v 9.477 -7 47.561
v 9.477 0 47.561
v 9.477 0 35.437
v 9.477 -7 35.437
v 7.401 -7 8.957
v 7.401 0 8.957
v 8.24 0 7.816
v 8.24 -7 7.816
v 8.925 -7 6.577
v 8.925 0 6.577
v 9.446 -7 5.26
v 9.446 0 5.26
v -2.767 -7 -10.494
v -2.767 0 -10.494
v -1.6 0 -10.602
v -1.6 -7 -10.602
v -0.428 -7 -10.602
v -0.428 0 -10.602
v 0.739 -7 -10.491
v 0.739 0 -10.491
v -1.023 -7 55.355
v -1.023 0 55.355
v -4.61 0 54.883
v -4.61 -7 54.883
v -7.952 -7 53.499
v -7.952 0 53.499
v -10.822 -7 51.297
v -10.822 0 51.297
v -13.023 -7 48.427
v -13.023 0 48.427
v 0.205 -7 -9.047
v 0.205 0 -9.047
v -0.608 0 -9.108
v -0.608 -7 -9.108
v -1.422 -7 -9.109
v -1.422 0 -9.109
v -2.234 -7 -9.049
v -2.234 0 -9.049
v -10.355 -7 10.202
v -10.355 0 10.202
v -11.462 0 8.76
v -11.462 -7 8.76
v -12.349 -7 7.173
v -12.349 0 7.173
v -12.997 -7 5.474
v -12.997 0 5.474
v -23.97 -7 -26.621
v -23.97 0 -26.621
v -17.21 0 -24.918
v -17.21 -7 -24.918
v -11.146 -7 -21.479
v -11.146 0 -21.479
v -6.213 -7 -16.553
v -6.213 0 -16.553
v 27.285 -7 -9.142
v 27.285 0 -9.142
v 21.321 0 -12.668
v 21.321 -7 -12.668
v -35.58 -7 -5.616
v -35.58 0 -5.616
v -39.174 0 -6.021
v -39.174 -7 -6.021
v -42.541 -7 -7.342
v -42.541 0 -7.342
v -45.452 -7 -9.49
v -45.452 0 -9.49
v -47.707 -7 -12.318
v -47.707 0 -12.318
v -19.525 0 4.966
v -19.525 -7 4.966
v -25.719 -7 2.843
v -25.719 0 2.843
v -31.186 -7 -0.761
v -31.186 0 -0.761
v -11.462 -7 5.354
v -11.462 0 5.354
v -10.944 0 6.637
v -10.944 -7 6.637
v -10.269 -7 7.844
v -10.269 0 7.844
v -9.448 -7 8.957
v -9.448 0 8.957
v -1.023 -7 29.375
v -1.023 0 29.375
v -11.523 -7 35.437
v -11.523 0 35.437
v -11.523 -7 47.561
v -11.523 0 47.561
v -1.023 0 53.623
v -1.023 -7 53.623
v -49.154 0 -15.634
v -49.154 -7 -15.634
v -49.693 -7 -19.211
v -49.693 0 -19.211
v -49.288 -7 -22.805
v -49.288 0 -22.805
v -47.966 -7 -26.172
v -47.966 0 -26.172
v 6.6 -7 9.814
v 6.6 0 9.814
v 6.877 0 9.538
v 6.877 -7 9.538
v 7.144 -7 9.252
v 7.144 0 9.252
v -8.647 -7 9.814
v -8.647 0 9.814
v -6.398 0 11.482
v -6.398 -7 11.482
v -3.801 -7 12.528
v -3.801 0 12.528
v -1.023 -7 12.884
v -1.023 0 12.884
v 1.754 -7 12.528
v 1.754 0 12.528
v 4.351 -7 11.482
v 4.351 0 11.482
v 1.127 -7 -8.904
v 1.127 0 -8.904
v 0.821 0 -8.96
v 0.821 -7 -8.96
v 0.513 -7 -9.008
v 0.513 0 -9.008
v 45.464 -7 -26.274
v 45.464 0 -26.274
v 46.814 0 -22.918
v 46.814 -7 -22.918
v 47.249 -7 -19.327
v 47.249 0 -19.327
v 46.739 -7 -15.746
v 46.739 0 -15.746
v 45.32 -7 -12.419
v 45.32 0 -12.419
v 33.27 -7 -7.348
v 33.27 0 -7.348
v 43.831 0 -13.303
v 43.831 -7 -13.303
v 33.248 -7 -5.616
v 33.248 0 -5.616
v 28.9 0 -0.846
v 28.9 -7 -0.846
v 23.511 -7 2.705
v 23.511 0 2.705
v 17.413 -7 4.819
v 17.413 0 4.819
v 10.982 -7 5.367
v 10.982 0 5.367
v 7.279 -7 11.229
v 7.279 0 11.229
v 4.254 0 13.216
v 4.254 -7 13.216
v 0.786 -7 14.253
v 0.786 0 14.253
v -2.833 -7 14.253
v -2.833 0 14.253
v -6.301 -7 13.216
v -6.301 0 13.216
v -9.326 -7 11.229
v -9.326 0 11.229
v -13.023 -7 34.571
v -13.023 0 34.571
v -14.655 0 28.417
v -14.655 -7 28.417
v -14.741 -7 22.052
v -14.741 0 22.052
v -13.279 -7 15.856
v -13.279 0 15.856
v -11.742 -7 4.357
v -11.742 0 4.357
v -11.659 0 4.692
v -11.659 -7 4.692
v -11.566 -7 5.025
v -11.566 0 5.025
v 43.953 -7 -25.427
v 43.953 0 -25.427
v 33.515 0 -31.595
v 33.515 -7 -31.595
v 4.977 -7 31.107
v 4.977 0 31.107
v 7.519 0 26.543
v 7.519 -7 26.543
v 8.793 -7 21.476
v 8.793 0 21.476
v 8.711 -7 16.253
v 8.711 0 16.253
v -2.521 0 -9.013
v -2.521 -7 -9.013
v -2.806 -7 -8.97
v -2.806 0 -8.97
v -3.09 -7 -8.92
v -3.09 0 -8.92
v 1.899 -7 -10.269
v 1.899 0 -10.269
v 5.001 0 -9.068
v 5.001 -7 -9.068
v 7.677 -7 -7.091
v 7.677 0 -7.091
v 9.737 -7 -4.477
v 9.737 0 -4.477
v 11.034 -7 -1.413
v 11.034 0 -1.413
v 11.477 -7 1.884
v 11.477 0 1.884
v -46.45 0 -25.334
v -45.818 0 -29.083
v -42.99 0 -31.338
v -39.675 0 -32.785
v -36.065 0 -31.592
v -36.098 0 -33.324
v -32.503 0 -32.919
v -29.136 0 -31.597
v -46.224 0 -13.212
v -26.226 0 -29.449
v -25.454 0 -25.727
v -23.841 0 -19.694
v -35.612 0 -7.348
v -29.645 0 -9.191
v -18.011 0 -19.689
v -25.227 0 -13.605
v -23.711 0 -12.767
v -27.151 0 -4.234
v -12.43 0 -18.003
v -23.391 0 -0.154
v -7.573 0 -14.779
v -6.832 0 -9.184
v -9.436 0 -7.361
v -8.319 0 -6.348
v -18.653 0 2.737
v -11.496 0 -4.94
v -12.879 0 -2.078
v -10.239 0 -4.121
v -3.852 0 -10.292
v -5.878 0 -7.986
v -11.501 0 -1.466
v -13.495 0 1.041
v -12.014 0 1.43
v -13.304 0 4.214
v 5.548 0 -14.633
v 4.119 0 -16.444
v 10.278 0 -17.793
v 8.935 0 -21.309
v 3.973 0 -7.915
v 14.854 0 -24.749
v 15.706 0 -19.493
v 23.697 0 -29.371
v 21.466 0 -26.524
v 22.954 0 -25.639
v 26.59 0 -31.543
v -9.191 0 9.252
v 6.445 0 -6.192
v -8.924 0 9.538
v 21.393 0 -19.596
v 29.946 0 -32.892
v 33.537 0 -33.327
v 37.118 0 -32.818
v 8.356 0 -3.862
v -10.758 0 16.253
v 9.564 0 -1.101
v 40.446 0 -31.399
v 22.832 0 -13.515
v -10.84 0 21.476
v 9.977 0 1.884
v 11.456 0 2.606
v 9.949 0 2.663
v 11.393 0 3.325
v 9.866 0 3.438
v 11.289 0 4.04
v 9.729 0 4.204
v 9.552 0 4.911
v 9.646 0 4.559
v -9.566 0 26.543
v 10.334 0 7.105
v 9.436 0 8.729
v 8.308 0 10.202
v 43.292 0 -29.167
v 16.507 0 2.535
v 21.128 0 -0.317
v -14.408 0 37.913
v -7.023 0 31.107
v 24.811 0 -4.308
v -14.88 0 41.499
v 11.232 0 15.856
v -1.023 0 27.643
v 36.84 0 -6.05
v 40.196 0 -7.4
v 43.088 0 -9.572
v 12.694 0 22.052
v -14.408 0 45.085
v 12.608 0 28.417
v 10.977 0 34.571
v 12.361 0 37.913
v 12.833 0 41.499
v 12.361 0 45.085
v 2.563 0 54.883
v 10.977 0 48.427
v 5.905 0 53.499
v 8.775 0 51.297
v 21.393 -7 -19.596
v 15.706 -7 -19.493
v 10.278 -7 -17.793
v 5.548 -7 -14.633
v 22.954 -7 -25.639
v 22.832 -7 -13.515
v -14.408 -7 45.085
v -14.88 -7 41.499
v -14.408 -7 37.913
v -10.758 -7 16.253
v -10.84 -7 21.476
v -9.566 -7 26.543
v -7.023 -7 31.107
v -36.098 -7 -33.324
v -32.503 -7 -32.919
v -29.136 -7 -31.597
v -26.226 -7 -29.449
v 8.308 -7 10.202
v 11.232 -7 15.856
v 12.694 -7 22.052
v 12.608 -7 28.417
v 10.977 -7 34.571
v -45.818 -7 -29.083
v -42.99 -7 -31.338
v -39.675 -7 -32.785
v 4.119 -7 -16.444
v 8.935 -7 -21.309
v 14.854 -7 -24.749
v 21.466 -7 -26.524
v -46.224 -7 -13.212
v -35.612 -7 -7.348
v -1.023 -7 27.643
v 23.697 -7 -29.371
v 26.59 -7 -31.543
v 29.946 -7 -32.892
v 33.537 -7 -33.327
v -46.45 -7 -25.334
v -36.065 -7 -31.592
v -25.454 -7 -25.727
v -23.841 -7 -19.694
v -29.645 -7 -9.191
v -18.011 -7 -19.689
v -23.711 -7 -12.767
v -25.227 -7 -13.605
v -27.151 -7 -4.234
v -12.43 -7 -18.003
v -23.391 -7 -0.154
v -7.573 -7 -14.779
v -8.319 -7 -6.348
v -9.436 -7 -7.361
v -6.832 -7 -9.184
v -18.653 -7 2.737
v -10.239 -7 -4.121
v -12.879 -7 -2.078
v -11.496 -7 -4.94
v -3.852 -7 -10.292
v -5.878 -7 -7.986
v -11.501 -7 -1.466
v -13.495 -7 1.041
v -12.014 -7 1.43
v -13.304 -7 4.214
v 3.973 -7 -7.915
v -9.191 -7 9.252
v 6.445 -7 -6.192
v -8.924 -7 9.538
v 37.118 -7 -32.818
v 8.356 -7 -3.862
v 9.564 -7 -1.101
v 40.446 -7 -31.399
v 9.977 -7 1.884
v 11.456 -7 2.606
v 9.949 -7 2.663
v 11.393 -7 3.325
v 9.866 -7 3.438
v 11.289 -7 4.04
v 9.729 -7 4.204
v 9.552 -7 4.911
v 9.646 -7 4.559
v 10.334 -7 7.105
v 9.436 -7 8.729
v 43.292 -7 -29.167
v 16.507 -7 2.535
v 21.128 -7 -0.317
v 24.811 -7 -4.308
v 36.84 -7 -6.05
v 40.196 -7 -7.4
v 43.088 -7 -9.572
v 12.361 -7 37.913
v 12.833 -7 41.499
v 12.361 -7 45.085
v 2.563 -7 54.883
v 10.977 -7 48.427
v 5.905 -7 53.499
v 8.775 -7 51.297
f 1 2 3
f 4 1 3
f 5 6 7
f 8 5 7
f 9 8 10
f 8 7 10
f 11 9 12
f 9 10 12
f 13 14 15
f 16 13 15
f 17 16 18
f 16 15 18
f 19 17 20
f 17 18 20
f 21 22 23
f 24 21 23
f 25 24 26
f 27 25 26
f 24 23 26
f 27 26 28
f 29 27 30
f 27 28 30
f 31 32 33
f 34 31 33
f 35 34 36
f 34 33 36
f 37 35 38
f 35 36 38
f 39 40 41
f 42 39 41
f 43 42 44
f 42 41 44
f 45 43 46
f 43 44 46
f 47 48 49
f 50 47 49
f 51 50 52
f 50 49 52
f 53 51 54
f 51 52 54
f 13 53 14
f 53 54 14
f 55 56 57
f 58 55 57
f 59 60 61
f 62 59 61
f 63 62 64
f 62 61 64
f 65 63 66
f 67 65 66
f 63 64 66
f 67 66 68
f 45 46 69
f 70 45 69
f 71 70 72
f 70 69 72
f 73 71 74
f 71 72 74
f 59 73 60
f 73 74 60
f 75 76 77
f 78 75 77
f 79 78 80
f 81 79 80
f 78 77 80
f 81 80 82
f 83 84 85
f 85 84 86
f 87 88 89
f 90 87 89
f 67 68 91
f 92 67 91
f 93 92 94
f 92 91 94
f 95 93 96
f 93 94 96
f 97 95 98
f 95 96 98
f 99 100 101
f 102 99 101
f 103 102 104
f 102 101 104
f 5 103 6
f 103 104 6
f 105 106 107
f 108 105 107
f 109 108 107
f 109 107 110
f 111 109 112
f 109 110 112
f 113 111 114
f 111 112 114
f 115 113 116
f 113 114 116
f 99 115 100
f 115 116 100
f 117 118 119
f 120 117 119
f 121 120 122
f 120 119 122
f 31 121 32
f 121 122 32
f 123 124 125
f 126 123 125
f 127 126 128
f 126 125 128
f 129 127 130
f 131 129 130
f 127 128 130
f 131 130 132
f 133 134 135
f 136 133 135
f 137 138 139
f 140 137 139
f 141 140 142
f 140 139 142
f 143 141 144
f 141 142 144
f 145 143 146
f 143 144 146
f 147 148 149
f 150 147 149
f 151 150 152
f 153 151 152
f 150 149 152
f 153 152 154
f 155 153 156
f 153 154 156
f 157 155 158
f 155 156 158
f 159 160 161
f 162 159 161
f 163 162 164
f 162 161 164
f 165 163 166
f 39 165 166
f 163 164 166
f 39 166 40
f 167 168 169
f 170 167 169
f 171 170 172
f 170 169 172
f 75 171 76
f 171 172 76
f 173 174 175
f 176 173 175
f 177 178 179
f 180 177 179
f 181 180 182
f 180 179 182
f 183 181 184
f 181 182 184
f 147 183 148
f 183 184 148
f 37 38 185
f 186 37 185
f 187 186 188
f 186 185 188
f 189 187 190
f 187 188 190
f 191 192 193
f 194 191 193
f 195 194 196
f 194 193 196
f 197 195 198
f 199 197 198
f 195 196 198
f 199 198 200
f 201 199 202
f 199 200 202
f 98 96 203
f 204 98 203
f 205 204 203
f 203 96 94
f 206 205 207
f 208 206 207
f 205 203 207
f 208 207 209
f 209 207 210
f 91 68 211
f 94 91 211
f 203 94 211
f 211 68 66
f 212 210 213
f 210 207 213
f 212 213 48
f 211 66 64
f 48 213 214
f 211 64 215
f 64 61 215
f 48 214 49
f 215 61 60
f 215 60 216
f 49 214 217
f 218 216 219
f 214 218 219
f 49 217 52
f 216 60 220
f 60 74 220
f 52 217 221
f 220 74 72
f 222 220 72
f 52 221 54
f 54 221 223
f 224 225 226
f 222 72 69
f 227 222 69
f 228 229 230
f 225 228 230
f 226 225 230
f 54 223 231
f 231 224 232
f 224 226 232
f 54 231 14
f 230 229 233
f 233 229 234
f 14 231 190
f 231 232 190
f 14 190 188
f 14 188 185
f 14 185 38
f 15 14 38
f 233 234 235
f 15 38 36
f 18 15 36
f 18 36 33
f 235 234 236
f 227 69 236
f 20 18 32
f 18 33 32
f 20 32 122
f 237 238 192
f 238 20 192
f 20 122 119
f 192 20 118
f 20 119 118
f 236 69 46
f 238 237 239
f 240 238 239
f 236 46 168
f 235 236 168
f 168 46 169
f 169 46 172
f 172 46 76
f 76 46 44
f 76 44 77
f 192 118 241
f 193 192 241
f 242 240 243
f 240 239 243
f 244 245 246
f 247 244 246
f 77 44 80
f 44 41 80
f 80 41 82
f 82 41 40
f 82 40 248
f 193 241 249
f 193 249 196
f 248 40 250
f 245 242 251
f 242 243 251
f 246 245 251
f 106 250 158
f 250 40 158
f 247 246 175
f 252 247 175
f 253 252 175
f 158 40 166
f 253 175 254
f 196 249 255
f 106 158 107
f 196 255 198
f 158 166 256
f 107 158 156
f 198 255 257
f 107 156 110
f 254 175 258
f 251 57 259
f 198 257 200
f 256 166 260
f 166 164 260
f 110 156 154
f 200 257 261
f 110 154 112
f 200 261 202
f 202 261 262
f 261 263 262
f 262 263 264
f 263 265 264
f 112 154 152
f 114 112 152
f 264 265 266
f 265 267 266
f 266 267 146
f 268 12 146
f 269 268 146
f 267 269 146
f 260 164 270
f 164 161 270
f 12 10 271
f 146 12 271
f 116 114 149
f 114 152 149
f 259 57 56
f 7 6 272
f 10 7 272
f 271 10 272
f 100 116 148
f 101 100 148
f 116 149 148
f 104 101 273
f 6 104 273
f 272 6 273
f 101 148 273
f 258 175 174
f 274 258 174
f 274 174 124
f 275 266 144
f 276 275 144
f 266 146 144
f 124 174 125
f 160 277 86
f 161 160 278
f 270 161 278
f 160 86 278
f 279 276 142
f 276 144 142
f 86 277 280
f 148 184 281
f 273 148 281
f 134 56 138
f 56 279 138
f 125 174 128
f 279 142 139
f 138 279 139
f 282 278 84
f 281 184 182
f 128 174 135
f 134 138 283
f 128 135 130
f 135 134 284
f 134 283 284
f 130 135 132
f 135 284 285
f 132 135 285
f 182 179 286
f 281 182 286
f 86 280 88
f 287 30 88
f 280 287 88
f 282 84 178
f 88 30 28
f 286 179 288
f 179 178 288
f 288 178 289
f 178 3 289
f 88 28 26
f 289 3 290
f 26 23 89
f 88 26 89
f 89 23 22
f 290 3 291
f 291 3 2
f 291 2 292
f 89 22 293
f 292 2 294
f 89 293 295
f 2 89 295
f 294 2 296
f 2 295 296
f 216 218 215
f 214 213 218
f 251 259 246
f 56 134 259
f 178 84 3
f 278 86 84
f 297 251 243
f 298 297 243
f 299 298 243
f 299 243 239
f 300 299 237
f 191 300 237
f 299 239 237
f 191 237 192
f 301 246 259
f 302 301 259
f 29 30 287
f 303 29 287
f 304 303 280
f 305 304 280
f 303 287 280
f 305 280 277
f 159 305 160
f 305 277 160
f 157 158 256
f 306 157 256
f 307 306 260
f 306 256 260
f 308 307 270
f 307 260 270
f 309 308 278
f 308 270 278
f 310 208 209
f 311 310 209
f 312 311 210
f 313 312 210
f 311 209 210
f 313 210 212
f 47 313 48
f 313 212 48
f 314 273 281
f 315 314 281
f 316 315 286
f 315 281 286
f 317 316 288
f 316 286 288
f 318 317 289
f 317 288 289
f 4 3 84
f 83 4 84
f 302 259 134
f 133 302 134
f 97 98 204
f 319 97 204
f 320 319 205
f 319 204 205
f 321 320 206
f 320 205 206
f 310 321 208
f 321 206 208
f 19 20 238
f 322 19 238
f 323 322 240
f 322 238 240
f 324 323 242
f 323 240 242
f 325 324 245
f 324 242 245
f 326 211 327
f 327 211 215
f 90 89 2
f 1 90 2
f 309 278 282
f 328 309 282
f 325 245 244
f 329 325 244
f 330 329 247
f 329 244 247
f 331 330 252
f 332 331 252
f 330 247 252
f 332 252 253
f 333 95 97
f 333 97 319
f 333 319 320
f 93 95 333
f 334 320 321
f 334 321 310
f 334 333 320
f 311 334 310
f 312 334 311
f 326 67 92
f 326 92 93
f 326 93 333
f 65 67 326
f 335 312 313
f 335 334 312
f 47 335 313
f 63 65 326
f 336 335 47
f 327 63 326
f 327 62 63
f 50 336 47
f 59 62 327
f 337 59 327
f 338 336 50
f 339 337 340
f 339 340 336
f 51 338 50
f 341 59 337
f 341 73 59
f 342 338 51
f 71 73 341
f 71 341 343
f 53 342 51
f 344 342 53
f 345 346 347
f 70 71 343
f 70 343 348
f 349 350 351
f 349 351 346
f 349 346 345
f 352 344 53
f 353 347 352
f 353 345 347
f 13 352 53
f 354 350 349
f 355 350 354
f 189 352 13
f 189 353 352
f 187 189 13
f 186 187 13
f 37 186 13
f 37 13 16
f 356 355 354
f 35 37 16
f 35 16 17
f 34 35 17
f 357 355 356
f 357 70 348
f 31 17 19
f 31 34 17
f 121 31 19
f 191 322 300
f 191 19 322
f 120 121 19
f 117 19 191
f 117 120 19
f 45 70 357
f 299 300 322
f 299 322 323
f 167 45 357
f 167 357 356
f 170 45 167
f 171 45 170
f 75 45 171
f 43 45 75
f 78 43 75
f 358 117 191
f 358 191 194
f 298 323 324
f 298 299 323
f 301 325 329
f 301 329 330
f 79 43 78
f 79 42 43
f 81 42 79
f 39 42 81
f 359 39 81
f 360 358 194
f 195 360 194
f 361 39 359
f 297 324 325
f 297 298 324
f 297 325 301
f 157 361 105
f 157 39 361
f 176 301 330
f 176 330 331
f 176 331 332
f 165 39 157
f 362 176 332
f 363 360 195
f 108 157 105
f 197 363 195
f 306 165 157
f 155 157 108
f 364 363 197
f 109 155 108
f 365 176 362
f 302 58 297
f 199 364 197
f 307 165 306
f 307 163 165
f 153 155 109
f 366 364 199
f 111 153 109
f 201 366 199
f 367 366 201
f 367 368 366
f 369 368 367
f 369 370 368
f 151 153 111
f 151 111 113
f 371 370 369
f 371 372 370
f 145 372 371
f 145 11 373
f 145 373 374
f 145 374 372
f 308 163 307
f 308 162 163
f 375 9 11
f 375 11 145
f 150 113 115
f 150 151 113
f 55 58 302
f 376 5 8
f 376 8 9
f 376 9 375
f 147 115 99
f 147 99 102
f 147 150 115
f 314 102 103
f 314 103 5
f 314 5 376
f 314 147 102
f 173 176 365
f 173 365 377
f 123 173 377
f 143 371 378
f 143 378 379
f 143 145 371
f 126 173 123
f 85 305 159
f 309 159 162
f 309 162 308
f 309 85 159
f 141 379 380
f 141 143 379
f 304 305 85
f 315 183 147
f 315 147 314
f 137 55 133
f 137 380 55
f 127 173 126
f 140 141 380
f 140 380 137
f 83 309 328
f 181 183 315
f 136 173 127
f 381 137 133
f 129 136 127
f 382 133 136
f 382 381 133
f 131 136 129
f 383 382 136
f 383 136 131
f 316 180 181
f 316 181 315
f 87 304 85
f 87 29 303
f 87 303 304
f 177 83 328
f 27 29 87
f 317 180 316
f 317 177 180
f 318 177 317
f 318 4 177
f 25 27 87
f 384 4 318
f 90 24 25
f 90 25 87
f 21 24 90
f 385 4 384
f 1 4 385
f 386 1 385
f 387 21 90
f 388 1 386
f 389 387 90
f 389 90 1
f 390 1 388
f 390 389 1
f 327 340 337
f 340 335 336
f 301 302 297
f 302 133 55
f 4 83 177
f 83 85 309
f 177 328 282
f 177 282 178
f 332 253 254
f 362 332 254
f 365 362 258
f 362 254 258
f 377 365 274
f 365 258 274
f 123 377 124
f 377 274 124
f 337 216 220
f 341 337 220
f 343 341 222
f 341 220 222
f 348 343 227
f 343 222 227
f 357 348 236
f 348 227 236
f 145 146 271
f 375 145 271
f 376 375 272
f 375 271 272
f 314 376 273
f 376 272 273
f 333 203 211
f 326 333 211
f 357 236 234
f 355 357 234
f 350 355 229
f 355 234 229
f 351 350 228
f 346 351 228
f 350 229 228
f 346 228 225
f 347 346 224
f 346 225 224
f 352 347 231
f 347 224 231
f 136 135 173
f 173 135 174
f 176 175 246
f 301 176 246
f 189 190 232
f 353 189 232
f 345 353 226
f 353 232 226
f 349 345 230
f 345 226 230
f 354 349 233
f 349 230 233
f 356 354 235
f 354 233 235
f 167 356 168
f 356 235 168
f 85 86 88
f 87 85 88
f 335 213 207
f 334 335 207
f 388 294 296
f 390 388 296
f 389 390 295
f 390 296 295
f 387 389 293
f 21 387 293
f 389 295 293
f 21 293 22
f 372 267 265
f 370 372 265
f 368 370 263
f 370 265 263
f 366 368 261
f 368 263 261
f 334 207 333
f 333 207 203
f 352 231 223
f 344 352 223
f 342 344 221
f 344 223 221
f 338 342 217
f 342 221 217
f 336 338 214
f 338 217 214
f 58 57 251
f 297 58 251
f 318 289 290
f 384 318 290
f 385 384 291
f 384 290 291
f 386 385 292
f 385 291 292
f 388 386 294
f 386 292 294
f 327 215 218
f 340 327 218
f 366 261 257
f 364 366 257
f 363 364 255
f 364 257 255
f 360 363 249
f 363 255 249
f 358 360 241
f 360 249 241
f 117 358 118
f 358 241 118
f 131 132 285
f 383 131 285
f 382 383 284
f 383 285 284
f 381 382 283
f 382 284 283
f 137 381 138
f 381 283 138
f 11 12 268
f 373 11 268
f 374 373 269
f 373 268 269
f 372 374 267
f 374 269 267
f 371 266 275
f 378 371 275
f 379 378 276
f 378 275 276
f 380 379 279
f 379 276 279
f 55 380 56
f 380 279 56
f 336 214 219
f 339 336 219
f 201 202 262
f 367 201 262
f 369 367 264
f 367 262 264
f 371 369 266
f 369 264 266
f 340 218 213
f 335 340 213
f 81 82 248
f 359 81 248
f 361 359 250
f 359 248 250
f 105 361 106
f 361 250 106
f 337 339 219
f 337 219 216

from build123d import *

# Parameters (mm, degrees)
F1_DEPTH = 7


with BuildPart() as f1:
    # F0 (on Front) → F1 (new body)
    with BuildSketch(Plane.XZ):
        with BuildLine():
            ThreePointArc((9.4456717064, 5.2601498032), (9.600468476, 4.7358347218), (9.7290242066, 4.2044763037))
            ThreePointArc((9.7290242066, 4.2044763037), (10.5107755148, 4.1373297128), (11.2892914689, 4.039571431))
            ThreePointArc((11.2892914689, 4.039571431), (11.15356321, 4.7072616256), (10.9816558574, 5.3665644531))
            ThreePointArc((10.9816558574, 5.3665644531), (10.2128759024, 5.324729345), (9.4456717064, 5.2601498032))
        make_face()
        with BuildLine():
            ThreePointArc((1.898740022, -10.2693575702), (1.4992647233, -9.5940330125), (1.1265857306, -8.9035591601))
            ThreePointArc((1.1265857306, -8.9035591601), (0.6670742909, -8.9850482544), (0.2045199529, -9.0469733711))
            ThreePointArc((0.2045199529, -9.0469733711), (0.4611512695, -9.7728612156), (0.7391628535, -10.4908322141))
            ThreePointArc((0.7391628535, -10.4908322141), (1.3215674895, -10.3937917824), (1.898740022, -10.2693575702))
        make_face()
        with BuildLine():
            ThreePointArc((7.4010012493, 8.9573059217), (8.6025045117, 7.207814721), (9.4456717064, 5.2601498032))
            ThreePointArc((9.4456717064, 5.2601498032), (10.2128759024, 5.324729345), (10.9816558574, 5.3665644531))
            ThreePointArc((10.9816558574, 5.3665644531), (9.9151405096, 7.9337532424), (8.3076151809, 10.2017425688))
            ThreePointArc((8.3076151809, 10.2017425688), (7.8635218541, 9.5728117995), (7.4010012493, 8.9573059217))
        make_face()
        with BuildLine():
            ThreePointArc((10.9816558574, 5.3665644531), (11.15356321, 4.7072616256), (11.2892914689, 4.039571431))
            ThreePointArc((11.2892914689, 4.039571431), (21.1279000718, -0.3174690096), (27.2848663586, -9.1420815667))
            Line((27.2848663586, -9.1420815667), (33.2484716393, -5.6156936051))
            ThreePointArc((33.2484716393, -5.6156936051), (23.5106289822, 2.7049804784), (10.9816558574, 5.3665644531))
        make_face()
        with BuildLine():
            ThreePointArc((0.7391628535, -10.4908322141), (0.4611512695, -9.7728612156), (0.2045199529, -9.0469733711))
            ThreePointArc((0.2045199529, -9.0469733711), (-1.0148426173, -9.1157310346), (-2.2343118188, -9.0488912223))
            ThreePointArc((-2.2343118188, -9.0488912223), (-2.4898011698, -9.7751817889), (-2.766683213, -10.4935891452))
            ThreePointArc((-2.766683213, -10.4935891452), (-1.013663046, -10.6157305708), (0.7391628535, -10.4908322141))
        make_face()
        with BuildLine():
            ThreePointArc((21.3933999959, -19.5962971804), (10.2778559187, -17.7925937698), (1.898740022, -10.2693575702))
            ThreePointArc((1.898740022, -10.2693575702), (1.3215674895, -10.3937917824), (0.7391628535, -10.4908322141))
            ThreePointArc((0.7391628535, -10.4908322141), (8.9347991107, -21.3094914503), (21.465538914, -26.5241248325))
            Line((21.465538914, -26.5241248325), (21.3933999959, -19.5962971804))
        make_face()
        with BuildLine():
            ThreePointArc((6.5996179621, 9.8144725101), (7.0117476249, 9.3965828635), (7.4010012493, 8.9573059217))
            ThreePointArc((7.4010012493, 8.9573059217), (7.8635218541, 9.5728117995), (8.3076151809, 10.2017425688))
            ThreePointArc((8.3076151809, 10.2017425688), (7.8082455965, 10.7301909978), (7.2789963207, 11.2287117377))
            ThreePointArc((7.2789963207, 11.2287117377), (6.9531804871, 10.5149275861), (6.5996179621, 9.8144725101))
        make_face()
        Polygon((33.2484716393, -5.6156936051), (27.2848663586, -9.1420815667), (21.3212610779, -12.6684695284), (21.3933999959, -19.5962971804), (21.465538914, -26.5241248325), (33.5370273114, -33.3270042133), (45.4642378728, -26.27422829), (45.3199600368, -12.4185729859), align=None)
        Polygon((43.9534161867, -25.4272131297), (33.5151531146, -31.5950866723), (22.9544864033, -25.6392224518), (22.8320827641, -13.5154846887), (33.2703458362, -7.3476111461), (43.8310125475, -13.3034753666), align=None, mode=Mode.SUBTRACT)
        with BuildLine():
            ThreePointArc((-2.766683213, -10.4935891452), (-2.4898011698, -9.7751817889), (-2.2343118188, -9.0488912223))
            ThreePointArc((-2.2343118188, -9.0488912223), (-2.663486724, -8.9927937788), (-3.0901225116, -8.9198559485))
            ThreePointArc((-3.0901225116, -8.9198559485), (-3.4574533465, -9.6131898005), (-3.8516967834, -10.2915819326))
            ThreePointArc((-3.8516967834, -10.2915819326), (-3.3114205546, -10.40456622), (-2.766683213, -10.4935891452))
        make_face()
        with BuildLine():
            ThreePointArc((7.2789963207, 11.2287117377), (7.8082455965, 10.7301909978), (8.3076151809, 10.2017425688))
            ThreePointArc((8.3076151809, 10.2017425688), (12.6944510585, 22.0519846925), (10.9765378838, 34.5708241647))
            Line((10.9765378838, 34.5708241647), (4.9765378838, 31.1067225496))
            ThreePointArc((4.9765378838, 31.1067225496), (8.7925937074, 21.4763824602), (7.2789963207, 11.2287117377))
        make_face()
        with BuildLine():
            ThreePointArc((45.3199600368, -12.4185729859), (40.1957356919, -7.3996709353), (33.2484716393, -5.6156936051))
            Line((33.2484716393, -5.6156936051), (45.3199600368, -12.4185729859))
        make_face()
        with BuildLine():
            ThreePointArc((-23.9704121928, -26.6211414084), (-11.1460643449, -21.4793793566), (-2.766683213, -10.4935891452))
            ThreePointArc((-2.766683213, -10.4935891452), (-3.3114205546, -10.40456622), (-3.8516967834, -10.2915819326))
            ThreePointArc((-3.8516967834, -10.2915819326), (-12.4303730025, -18.0029612656), (-23.8408479408, -19.6941497739))
            Line((-23.8408479408, -19.6941497739), (-23.9704121928, -26.6211414084))
        make_face()
        with BuildLine():
            Line((33.5370273114, -33.3270042133), (21.465538914, -26.5241248325))
            ThreePointArc((21.465538914, -26.5241248325), (26.5897632589, -31.5430268831), (33.5370273114, -33.3270042133))
        make_face()
        with BuildLine():
            ThreePointArc((-9.4479712841, 8.9573244772), (-9.0587156546, 9.3966016714), (-8.6465839183, 9.8144914063))
            ThreePointArc((-8.6465839183, 9.8144914063), (-9.0001447069, 10.5149473587), (-9.3259587712, 11.2287323179))
            ThreePointArc((-9.3259587712, 11.2287323179), (-9.8552105045, 10.7302116701), (-10.3545824748, 10.2017631212))
            ThreePointArc((-10.3545824748, 10.2017631212), (-9.9104905332, 9.5728313737), (-9.4479712841, 8.9573244772))
        make_face()
        Polygon((4.9765378838, 31.1067225496), (10.9765378838, 34.5708241647), (10.9765378838, 48.4272306253), (-1.0234621162, 55.3554338556), (-13.0234621162, 48.4272306253), (-13.0234621162, 34.5708241647), (-7.0234621162, 31.1067225496), (-1.0234621162, 27.6426209345), align=None)
        Polygon((-1.0234314257, 53.623383048), (9.476553229, 47.5611786427), (9.4765225384, 35.4368229897), (-1.0234928068, 29.3746717421), (-11.5234774615, 35.4368761474), (-11.5234467709, 47.5612318003), align=None, mode=Mode.SUBTRACT)
        with BuildLine():
            Line((10.9765378838, 48.4272306253), (10.9765378838, 34.5708241647))
            ThreePointArc((10.9765378838, 34.5708241647), (12.833161952, 41.499027395), (10.9765378838, 48.4272306253))
        make_face()
        with BuildLine():
            ThreePointArc((45.4642378728, -26.27422829), (47.2486223754, -19.3270688073), (45.3199600368, -12.4185729859))
            Line((45.3199600368, -12.4185729859), (45.4642378728, -26.27422829))
        make_face()
        with BuildLine():
            ThreePointArc((-13.3043943376, 4.2143852159), (-12.5245673718, 4.301066678), (-11.7419405373, 4.3570935503))
            ThreePointArc((-11.7419405373, 4.3570935503), (-11.6136761156, 4.8588272943), (-11.4619392518, 5.3539681185))
            ThreePointArc((-11.4619392518, 5.3539681185), (-12.2285329906, 5.425430242), (-12.9969065423, 5.474162989))
            ThreePointArc((-12.9969065423, 5.474162989), (-13.1669977485, 4.8482641696), (-13.3043943376, 4.2143852159))
        make_face()
        Polygon((-36.0978778993, -33.3237211757), (-23.9704121928, -26.6211414084), (-23.8408479408, -19.6941497739), (-23.7112836889, -12.7671581394), (-29.6454522902, -9.1914563885), (-35.5796208915, -5.6157546377), (-47.707086598, -12.3183344049), (-47.9662151019, -26.172317674), align=None)
        Polygon((-35.6120119545, -7.3475025463), (-25.2272169022, -13.6049806103), (-25.4539543431, -25.7272159707), (-36.0654868363, -31.5919732671), (-46.4502818886, -25.3344952031), (-46.2235444477, -13.2122598427), align=None, mode=Mode.SUBTRACT)
        with BuildLine():
            ThreePointArc((-36.0978778993, -33.3237211757), (-29.1360643676, -31.5973940688), (-23.9704121928, -26.6211414084))
            Line((-23.9704121928, -26.6211414084), (-36.0978778993, -33.3237211757))
        make_face()
        with BuildLine():
            Line((45.4642378728, -26.27422829), (33.5370273114, -33.3270042133))
            ThreePointArc((33.5370273114, -33.3270042133), (40.4456361588, -31.3987467812), (45.4642378728, -26.27422829))
        make_face()
        with BuildLine():
            ThreePointArc((-11.4619392518, 5.3539681185), (-10.6254992856, 7.2509658151), (-9.4479712841, 8.9573244772))
            ThreePointArc((-9.4479712841, 8.9573244772), (-9.9104905332, 9.5728313737), (-10.3545824748, 10.2017631212))
            ThreePointArc((-10.3545824748, 10.2017631212), (-11.9348638054, 7.9827885766), (-12.9969065423, 5.474162989))
            ThreePointArc((-12.9969065423, 5.474162989), (-12.2285329906, 5.425430242), (-11.4619392518, 5.3539681185))
        make_face()
        with BuildLine():
            ThreePointArc((-10.3545824748, 10.2017631212), (-9.8552105045, 10.7302116701), (-9.3259587712, 11.2287323179))
            ThreePointArc((-9.3259587712, 11.2287323179), (-10.8395318221, 21.4763975879), (-7.0234621162, 31.1067225496))
            Line((-7.0234621162, 31.1067225496), (-13.0234621162, 34.5708241647))
            ThreePointArc((-13.0234621162, 34.5708241647), (-14.741390701, 22.0520007508), (-10.3545824748, 10.2017631212))
        make_face()
        with BuildLine():
            Line((-1.0234621162, 55.3554338556), (10.9765378838, 48.4272306253))
            ThreePointArc((10.9765378838, 48.4272306253), (5.9048499179, 53.4992158488), (-1.0234621162, 55.3554338556))
        make_face()
        with BuildLine():
            ThreePointArc((-29.6454522902, -9.1914563885), (-23.3905035411, -0.1535380211), (-13.3043943376, 4.2143852159))
            ThreePointArc((-13.3043943376, 4.2143852159), (-13.1669977485, 4.8482641696), (-12.9969065423, 5.474162989))
            ThreePointArc((-12.9969065423, 5.474162989), (-25.7189527233, 2.8425568481), (-35.5796208915, -5.6157546377))
            Line((-35.5796208915, -5.6157546377), (-29.6454522902, -9.1914563885))
        make_face()
        with BuildLine():
            ThreePointArc((-47.9662151019, -26.172317674), (-42.9902652062, -31.3382614954), (-36.0978778993, -33.3237211757))
            Line((-36.0978778993, -33.3237211757), (-47.9662151019, -26.172317674))
        make_face()
        with BuildLine():
            Line((-13.0234621162, 48.4272306253), (-1.0234621162, 55.3554338556))
            ThreePointArc((-1.0234621162, 55.3554338556), (-7.9517741504, 53.4992158488), (-13.0234621162, 48.4272306253))
        make_face()
        with BuildLine():
            ThreePointArc((-47.707086598, -12.3183344049), (-49.6929502341, -19.2106053333), (-47.9662151019, -26.172317674))
            Line((-47.9662151019, -26.172317674), (-47.707086598, -12.3183344049))
        make_face()
        with BuildLine():
            ThreePointArc((-13.0234621162, 48.4272306253), (-14.8800861845, 41.499027395), (-13.0234621162, 34.5708241647))
            Line((-13.0234621162, 34.5708241647), (-13.0234621162, 48.4272306253))
        make_face()
        with BuildLine():
            Line((-47.707086598, -12.3183344049), (-35.5796208915, -5.6157546377))
            ThreePointArc((-35.5796208915, -5.6157546377), (-42.5414344232, -7.3420817446), (-47.707086598, -12.3183344049))
        make_face()
        with BuildLine():
            ThreePointArc((-3.8516967834, -10.2915819326), (-3.4574533465, -9.6131898005), (-3.0901225116, -8.9198559485))
            ThreePointArc((-3.0901225116, -8.9198559485), (-10.2394516965, -4.1212403882), (-11.7419405373, 4.3570935503))
            ThreePointArc((-11.7419405373, 4.3570935503), (-12.5245673718, 4.301066678), (-13.3043943376, 4.2143852159))
            ThreePointArc((-13.3043943376, 4.2143852159), (-11.4961733632, -4.940173018), (-3.8516967834, -10.2915819326))
        make_face()
        with BuildLine():
            ThreePointArc((-8.6465839183, 9.8144914063), (-1.0234791734, 12.8842655642), (6.5996179621, 9.8144725101))
            ThreePointArc((6.5996179621, 9.8144725101), (6.9531804871, 10.5149275861), (7.2789963207, 11.2287117377))
            ThreePointArc((7.2789963207, 11.2287117377), (-1.0234773143, 14.3842655642), (-9.3259587712, 11.2287323179))
            ThreePointArc((-9.3259587712, 11.2287323179), (-9.0001447069, 10.5149473587), (-8.6465839183, 9.8144914063))
        make_face()
        with BuildLine():
            ThreePointArc((9.7290242066, 4.2044763037), (9.9144614614, 3.0509516514), (9.9765071932, 1.8842655643))
            ThreePointArc((9.9765071932, 1.8842655643), (7.4809432095, -5.0924505719), (1.1265857306, -8.9035591601))
            ThreePointArc((1.1265857306, -8.9035591601), (1.4992647233, -9.5940330125), (1.898740022, -10.2693575702))
            ThreePointArc((1.898740022, -10.2693575702), (8.7942948859, -5.8527264107), (11.4765071932, 1.8842655643))
            ThreePointArc((11.4765071932, 1.8842655643), (11.4296153082, 2.9659763743), (11.2892914689, 4.039571431))
            ThreePointArc((11.2892914689, 4.039571431), (10.5107755148, 4.1373297128), (9.7290242066, 4.2044763037))
        make_face()
    extrude(amount=F1_DEPTH)


solid = f1.part
